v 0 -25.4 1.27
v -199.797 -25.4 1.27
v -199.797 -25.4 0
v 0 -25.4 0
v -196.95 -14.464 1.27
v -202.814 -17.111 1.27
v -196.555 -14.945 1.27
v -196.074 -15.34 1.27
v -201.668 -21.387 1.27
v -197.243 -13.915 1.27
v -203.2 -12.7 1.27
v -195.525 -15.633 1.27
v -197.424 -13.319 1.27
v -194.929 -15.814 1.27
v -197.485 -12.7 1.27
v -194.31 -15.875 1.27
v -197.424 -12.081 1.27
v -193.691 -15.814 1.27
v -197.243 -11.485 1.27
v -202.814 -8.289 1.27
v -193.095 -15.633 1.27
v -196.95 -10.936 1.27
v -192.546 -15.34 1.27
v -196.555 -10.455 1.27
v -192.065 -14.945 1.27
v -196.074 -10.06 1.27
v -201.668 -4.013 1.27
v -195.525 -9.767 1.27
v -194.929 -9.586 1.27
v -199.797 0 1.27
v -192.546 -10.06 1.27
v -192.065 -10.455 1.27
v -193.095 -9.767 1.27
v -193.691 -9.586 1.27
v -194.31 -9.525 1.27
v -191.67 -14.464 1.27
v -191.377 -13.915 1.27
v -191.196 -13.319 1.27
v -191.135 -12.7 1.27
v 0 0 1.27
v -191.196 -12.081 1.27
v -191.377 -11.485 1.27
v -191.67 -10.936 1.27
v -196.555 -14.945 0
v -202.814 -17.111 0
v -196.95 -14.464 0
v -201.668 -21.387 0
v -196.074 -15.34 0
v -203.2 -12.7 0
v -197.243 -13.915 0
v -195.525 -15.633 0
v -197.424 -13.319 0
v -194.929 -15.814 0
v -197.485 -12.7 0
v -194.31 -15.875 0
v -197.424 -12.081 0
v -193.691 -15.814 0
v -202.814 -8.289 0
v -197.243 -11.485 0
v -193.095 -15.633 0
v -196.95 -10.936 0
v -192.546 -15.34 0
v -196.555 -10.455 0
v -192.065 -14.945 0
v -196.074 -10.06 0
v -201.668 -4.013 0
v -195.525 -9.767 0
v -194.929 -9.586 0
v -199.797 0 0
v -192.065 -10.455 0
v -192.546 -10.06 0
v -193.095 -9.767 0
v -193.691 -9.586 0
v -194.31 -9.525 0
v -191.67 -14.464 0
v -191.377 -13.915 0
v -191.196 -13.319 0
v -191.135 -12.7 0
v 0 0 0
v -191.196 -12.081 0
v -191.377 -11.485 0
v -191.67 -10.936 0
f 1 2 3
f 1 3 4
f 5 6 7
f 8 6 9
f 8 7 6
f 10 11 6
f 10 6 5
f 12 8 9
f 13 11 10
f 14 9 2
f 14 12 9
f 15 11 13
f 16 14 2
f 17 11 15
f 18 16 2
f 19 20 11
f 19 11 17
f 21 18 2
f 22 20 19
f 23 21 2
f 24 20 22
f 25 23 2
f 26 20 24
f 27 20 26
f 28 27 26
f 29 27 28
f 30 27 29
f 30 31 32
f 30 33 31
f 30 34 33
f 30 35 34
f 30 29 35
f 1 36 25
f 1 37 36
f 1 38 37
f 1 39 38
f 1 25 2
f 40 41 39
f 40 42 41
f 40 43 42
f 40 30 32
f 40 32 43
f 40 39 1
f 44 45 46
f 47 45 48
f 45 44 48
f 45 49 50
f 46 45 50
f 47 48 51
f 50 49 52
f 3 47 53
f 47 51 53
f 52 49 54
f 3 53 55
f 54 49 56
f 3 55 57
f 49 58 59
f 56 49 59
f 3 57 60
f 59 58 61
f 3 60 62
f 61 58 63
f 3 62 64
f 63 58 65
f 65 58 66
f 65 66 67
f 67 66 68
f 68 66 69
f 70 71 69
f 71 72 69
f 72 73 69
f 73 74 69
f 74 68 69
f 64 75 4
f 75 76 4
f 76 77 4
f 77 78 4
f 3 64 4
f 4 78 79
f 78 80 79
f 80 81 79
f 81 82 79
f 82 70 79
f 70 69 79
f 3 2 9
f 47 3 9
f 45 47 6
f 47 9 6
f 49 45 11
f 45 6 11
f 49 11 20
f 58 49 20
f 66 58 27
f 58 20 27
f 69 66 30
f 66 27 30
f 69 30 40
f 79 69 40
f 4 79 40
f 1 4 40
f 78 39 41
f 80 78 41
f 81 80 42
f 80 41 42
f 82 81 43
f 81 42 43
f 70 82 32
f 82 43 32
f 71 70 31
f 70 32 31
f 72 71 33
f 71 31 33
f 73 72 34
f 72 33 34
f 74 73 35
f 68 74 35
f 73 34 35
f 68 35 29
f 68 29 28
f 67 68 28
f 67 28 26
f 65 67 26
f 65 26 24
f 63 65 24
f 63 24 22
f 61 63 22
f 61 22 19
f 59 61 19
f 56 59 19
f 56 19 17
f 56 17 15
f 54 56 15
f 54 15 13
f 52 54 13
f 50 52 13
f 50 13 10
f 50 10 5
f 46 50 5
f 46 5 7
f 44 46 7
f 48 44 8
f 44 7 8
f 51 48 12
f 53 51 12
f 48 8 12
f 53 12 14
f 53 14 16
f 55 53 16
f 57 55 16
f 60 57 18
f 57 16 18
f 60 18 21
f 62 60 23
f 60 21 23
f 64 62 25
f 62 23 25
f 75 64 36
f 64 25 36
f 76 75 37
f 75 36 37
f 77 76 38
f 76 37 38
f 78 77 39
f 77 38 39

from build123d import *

# Parameters (mm, degrees)
F0_W     = 203.2
F0_H     = 1.27
F1_DEPTH = 25.4
F2_R     = 3.175
F3_DEPTH = 25.4


with BuildPart() as f1:
    # F0 (on Front) → F1 (new body)
    with BuildSketch(Plane.XZ):
        with Locations((-101.6, 0.635)):
            Rectangle(F0_W, F0_H)
    extrude(amount=F1_DEPTH)

    # F2 (on face) → F3 (cut)
    with BuildSketch(Plane.XY.offset(1.27)):
        with BuildLine():
            ThreePointArc((-199.797045, -25.4), (-202.334516, -19.274004), (-203.2, -12.7))
            Line((-203.2, -12.7), (-203.2, -25.4))
            Line((-203.2, -25.4), (-199.797045, -25.4))
        make_face()
        with BuildLine():
            ThreePointArc((-203.2, -12.7), (-202.334516, -6.125996), (-199.797045, 0))
            Line((-199.797045, 0), (-203.2, 0))
            Line((-203.2, 0), (-203.2, -12.7))
        make_face()
        with Locations((-194.31, -12.7)):
            Circle(F2_R)
    extrude(amount=-F3_DEPTH, mode=Mode.SUBTRACT)


solid = f1.part
